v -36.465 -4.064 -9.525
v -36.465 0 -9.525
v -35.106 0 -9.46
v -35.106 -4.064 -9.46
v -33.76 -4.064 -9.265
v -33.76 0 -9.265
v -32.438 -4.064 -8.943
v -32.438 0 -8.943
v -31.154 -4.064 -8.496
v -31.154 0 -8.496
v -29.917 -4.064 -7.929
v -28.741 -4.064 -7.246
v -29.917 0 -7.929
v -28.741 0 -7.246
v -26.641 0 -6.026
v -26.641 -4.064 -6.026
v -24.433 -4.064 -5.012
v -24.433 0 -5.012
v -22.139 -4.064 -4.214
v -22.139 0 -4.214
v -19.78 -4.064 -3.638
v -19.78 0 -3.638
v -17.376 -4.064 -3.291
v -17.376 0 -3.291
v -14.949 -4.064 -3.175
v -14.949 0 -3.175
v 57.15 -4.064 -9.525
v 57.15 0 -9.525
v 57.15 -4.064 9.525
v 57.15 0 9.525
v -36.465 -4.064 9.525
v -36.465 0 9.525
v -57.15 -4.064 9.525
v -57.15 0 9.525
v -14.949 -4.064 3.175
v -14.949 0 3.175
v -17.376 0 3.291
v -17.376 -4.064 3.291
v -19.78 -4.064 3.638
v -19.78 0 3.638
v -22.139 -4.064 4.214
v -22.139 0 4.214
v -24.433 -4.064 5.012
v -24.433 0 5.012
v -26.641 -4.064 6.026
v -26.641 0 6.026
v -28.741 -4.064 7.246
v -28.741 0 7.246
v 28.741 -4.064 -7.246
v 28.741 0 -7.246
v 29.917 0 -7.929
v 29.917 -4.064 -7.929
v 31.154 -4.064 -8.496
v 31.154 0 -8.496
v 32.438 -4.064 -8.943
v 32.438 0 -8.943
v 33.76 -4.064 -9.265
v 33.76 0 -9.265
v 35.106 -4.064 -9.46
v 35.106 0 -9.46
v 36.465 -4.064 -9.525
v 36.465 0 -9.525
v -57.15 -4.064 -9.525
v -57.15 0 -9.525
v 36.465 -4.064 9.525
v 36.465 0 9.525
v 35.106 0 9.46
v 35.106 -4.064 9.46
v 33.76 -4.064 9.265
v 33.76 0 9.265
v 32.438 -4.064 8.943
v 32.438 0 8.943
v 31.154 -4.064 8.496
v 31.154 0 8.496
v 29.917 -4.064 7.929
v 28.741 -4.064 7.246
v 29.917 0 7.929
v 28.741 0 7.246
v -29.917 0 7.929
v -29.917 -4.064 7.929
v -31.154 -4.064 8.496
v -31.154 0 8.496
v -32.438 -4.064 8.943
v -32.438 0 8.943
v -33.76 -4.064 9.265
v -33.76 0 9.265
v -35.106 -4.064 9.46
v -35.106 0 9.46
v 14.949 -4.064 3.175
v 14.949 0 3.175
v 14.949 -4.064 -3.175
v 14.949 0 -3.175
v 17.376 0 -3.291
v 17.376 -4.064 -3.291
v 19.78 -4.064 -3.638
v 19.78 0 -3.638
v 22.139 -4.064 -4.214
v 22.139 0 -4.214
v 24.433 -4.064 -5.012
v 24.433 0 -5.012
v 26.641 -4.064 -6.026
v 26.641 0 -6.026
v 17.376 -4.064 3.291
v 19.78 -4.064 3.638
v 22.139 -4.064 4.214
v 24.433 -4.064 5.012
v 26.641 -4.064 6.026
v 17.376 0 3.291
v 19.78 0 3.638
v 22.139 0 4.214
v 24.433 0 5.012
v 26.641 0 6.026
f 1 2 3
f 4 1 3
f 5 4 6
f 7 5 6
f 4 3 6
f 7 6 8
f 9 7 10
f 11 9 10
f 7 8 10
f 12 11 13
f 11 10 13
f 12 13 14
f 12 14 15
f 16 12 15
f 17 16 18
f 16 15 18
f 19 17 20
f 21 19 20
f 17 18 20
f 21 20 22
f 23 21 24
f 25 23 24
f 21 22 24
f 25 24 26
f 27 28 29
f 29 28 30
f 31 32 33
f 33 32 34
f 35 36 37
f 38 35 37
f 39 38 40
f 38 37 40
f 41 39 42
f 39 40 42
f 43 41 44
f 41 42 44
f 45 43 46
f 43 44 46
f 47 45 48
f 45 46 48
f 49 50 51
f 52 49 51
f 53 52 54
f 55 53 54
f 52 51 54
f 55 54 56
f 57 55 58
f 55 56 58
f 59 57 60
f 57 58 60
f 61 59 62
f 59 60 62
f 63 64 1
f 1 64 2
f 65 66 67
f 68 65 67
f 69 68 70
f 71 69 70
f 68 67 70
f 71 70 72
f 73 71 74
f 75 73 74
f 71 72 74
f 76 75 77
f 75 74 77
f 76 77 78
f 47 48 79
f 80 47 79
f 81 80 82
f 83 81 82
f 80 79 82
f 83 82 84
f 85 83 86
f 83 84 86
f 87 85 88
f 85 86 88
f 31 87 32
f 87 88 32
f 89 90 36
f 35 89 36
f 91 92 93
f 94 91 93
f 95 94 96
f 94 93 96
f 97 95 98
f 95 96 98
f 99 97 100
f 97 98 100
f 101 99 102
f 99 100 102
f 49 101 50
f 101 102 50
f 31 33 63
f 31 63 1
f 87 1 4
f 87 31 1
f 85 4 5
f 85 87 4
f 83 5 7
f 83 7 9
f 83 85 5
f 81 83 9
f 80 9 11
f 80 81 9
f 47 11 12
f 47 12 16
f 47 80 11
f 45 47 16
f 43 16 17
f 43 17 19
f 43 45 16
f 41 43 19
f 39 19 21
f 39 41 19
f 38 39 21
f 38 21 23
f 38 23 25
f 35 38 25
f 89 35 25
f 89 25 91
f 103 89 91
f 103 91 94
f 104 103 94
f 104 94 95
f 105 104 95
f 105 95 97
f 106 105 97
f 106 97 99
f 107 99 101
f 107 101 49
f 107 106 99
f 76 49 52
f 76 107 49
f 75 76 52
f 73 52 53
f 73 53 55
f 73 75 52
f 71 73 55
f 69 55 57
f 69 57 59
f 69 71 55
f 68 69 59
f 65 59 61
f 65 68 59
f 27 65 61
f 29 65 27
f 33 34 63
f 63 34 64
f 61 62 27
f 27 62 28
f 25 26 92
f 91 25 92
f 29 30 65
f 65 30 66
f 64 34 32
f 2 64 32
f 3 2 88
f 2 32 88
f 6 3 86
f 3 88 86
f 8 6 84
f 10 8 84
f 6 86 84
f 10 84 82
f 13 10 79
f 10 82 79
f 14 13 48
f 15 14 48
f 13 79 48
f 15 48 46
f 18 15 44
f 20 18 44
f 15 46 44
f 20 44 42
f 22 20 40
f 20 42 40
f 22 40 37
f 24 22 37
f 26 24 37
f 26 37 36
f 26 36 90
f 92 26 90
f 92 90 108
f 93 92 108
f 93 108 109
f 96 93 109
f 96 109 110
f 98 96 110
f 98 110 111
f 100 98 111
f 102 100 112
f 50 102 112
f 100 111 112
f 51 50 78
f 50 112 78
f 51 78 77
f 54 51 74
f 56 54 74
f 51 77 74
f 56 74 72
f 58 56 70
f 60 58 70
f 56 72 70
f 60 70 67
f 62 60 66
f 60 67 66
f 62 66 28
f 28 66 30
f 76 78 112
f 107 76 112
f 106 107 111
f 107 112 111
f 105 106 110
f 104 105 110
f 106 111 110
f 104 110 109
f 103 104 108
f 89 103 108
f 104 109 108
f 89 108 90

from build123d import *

# Parameters (mm, degrees)
F1_DEPTH = 4.064


with BuildPart() as f1:
    # F0 (on Front) → F1 (new body)
    with BuildSketch(Plane.XZ):
        with BuildLine():
            Line((14.949479, 3.175), (0, 3.175))
            Line((0, 3.175), (-14.949479, 3.175))
            ThreePointArc((-14.949479, 3.175), (-22.139438, 4.213873), (-28.741251, 7.245513))
            ThreePointArc((-28.741251, 7.245513), (-32.438266, 8.943231), (-36.464644, 9.525))
            Line((-36.464644, 9.525), (-57.15, 9.525))
            Line((-57.15, 9.525), (-57.15, 0))
            Line((-57.15, 0), (-57.15, -9.525))
            Line((-57.15, -9.525), (-36.464644, -9.525))
            ThreePointArc((-36.464644, -9.525), (-32.438266, -8.943231), (-28.741251, -7.245513))
            ThreePointArc((-28.741251, -7.245513), (-22.139438, -4.213873), (-14.949479, -3.175))
            Line((-14.949479, -3.175), (0, -3.175))
            Line((0, -3.175), (14.949479, -3.175))
            ThreePointArc((14.949479, -3.175), (22.139438, -4.213873), (28.741251, -7.245513))
            ThreePointArc((28.741251, -7.245513), (32.438266, -8.943231), (36.464644, -9.525))
            Line((36.464644, -9.525), (57.15, -9.525))
            Line((57.15, -9.525), (57.15, 0))
            Line((57.15, 0), (57.15, 9.525))
            Line((57.15, 9.525), (36.464644, 9.525))
            ThreePointArc((36.464644, 9.525), (32.438266, 8.943231), (28.741251, 7.245513))
            ThreePointArc((28.741251, 7.245513), (22.139438, 4.213873), (14.949479, 3.175))
        make_face()
    extrude(amount=F1_DEPTH)


solid = f1.part
